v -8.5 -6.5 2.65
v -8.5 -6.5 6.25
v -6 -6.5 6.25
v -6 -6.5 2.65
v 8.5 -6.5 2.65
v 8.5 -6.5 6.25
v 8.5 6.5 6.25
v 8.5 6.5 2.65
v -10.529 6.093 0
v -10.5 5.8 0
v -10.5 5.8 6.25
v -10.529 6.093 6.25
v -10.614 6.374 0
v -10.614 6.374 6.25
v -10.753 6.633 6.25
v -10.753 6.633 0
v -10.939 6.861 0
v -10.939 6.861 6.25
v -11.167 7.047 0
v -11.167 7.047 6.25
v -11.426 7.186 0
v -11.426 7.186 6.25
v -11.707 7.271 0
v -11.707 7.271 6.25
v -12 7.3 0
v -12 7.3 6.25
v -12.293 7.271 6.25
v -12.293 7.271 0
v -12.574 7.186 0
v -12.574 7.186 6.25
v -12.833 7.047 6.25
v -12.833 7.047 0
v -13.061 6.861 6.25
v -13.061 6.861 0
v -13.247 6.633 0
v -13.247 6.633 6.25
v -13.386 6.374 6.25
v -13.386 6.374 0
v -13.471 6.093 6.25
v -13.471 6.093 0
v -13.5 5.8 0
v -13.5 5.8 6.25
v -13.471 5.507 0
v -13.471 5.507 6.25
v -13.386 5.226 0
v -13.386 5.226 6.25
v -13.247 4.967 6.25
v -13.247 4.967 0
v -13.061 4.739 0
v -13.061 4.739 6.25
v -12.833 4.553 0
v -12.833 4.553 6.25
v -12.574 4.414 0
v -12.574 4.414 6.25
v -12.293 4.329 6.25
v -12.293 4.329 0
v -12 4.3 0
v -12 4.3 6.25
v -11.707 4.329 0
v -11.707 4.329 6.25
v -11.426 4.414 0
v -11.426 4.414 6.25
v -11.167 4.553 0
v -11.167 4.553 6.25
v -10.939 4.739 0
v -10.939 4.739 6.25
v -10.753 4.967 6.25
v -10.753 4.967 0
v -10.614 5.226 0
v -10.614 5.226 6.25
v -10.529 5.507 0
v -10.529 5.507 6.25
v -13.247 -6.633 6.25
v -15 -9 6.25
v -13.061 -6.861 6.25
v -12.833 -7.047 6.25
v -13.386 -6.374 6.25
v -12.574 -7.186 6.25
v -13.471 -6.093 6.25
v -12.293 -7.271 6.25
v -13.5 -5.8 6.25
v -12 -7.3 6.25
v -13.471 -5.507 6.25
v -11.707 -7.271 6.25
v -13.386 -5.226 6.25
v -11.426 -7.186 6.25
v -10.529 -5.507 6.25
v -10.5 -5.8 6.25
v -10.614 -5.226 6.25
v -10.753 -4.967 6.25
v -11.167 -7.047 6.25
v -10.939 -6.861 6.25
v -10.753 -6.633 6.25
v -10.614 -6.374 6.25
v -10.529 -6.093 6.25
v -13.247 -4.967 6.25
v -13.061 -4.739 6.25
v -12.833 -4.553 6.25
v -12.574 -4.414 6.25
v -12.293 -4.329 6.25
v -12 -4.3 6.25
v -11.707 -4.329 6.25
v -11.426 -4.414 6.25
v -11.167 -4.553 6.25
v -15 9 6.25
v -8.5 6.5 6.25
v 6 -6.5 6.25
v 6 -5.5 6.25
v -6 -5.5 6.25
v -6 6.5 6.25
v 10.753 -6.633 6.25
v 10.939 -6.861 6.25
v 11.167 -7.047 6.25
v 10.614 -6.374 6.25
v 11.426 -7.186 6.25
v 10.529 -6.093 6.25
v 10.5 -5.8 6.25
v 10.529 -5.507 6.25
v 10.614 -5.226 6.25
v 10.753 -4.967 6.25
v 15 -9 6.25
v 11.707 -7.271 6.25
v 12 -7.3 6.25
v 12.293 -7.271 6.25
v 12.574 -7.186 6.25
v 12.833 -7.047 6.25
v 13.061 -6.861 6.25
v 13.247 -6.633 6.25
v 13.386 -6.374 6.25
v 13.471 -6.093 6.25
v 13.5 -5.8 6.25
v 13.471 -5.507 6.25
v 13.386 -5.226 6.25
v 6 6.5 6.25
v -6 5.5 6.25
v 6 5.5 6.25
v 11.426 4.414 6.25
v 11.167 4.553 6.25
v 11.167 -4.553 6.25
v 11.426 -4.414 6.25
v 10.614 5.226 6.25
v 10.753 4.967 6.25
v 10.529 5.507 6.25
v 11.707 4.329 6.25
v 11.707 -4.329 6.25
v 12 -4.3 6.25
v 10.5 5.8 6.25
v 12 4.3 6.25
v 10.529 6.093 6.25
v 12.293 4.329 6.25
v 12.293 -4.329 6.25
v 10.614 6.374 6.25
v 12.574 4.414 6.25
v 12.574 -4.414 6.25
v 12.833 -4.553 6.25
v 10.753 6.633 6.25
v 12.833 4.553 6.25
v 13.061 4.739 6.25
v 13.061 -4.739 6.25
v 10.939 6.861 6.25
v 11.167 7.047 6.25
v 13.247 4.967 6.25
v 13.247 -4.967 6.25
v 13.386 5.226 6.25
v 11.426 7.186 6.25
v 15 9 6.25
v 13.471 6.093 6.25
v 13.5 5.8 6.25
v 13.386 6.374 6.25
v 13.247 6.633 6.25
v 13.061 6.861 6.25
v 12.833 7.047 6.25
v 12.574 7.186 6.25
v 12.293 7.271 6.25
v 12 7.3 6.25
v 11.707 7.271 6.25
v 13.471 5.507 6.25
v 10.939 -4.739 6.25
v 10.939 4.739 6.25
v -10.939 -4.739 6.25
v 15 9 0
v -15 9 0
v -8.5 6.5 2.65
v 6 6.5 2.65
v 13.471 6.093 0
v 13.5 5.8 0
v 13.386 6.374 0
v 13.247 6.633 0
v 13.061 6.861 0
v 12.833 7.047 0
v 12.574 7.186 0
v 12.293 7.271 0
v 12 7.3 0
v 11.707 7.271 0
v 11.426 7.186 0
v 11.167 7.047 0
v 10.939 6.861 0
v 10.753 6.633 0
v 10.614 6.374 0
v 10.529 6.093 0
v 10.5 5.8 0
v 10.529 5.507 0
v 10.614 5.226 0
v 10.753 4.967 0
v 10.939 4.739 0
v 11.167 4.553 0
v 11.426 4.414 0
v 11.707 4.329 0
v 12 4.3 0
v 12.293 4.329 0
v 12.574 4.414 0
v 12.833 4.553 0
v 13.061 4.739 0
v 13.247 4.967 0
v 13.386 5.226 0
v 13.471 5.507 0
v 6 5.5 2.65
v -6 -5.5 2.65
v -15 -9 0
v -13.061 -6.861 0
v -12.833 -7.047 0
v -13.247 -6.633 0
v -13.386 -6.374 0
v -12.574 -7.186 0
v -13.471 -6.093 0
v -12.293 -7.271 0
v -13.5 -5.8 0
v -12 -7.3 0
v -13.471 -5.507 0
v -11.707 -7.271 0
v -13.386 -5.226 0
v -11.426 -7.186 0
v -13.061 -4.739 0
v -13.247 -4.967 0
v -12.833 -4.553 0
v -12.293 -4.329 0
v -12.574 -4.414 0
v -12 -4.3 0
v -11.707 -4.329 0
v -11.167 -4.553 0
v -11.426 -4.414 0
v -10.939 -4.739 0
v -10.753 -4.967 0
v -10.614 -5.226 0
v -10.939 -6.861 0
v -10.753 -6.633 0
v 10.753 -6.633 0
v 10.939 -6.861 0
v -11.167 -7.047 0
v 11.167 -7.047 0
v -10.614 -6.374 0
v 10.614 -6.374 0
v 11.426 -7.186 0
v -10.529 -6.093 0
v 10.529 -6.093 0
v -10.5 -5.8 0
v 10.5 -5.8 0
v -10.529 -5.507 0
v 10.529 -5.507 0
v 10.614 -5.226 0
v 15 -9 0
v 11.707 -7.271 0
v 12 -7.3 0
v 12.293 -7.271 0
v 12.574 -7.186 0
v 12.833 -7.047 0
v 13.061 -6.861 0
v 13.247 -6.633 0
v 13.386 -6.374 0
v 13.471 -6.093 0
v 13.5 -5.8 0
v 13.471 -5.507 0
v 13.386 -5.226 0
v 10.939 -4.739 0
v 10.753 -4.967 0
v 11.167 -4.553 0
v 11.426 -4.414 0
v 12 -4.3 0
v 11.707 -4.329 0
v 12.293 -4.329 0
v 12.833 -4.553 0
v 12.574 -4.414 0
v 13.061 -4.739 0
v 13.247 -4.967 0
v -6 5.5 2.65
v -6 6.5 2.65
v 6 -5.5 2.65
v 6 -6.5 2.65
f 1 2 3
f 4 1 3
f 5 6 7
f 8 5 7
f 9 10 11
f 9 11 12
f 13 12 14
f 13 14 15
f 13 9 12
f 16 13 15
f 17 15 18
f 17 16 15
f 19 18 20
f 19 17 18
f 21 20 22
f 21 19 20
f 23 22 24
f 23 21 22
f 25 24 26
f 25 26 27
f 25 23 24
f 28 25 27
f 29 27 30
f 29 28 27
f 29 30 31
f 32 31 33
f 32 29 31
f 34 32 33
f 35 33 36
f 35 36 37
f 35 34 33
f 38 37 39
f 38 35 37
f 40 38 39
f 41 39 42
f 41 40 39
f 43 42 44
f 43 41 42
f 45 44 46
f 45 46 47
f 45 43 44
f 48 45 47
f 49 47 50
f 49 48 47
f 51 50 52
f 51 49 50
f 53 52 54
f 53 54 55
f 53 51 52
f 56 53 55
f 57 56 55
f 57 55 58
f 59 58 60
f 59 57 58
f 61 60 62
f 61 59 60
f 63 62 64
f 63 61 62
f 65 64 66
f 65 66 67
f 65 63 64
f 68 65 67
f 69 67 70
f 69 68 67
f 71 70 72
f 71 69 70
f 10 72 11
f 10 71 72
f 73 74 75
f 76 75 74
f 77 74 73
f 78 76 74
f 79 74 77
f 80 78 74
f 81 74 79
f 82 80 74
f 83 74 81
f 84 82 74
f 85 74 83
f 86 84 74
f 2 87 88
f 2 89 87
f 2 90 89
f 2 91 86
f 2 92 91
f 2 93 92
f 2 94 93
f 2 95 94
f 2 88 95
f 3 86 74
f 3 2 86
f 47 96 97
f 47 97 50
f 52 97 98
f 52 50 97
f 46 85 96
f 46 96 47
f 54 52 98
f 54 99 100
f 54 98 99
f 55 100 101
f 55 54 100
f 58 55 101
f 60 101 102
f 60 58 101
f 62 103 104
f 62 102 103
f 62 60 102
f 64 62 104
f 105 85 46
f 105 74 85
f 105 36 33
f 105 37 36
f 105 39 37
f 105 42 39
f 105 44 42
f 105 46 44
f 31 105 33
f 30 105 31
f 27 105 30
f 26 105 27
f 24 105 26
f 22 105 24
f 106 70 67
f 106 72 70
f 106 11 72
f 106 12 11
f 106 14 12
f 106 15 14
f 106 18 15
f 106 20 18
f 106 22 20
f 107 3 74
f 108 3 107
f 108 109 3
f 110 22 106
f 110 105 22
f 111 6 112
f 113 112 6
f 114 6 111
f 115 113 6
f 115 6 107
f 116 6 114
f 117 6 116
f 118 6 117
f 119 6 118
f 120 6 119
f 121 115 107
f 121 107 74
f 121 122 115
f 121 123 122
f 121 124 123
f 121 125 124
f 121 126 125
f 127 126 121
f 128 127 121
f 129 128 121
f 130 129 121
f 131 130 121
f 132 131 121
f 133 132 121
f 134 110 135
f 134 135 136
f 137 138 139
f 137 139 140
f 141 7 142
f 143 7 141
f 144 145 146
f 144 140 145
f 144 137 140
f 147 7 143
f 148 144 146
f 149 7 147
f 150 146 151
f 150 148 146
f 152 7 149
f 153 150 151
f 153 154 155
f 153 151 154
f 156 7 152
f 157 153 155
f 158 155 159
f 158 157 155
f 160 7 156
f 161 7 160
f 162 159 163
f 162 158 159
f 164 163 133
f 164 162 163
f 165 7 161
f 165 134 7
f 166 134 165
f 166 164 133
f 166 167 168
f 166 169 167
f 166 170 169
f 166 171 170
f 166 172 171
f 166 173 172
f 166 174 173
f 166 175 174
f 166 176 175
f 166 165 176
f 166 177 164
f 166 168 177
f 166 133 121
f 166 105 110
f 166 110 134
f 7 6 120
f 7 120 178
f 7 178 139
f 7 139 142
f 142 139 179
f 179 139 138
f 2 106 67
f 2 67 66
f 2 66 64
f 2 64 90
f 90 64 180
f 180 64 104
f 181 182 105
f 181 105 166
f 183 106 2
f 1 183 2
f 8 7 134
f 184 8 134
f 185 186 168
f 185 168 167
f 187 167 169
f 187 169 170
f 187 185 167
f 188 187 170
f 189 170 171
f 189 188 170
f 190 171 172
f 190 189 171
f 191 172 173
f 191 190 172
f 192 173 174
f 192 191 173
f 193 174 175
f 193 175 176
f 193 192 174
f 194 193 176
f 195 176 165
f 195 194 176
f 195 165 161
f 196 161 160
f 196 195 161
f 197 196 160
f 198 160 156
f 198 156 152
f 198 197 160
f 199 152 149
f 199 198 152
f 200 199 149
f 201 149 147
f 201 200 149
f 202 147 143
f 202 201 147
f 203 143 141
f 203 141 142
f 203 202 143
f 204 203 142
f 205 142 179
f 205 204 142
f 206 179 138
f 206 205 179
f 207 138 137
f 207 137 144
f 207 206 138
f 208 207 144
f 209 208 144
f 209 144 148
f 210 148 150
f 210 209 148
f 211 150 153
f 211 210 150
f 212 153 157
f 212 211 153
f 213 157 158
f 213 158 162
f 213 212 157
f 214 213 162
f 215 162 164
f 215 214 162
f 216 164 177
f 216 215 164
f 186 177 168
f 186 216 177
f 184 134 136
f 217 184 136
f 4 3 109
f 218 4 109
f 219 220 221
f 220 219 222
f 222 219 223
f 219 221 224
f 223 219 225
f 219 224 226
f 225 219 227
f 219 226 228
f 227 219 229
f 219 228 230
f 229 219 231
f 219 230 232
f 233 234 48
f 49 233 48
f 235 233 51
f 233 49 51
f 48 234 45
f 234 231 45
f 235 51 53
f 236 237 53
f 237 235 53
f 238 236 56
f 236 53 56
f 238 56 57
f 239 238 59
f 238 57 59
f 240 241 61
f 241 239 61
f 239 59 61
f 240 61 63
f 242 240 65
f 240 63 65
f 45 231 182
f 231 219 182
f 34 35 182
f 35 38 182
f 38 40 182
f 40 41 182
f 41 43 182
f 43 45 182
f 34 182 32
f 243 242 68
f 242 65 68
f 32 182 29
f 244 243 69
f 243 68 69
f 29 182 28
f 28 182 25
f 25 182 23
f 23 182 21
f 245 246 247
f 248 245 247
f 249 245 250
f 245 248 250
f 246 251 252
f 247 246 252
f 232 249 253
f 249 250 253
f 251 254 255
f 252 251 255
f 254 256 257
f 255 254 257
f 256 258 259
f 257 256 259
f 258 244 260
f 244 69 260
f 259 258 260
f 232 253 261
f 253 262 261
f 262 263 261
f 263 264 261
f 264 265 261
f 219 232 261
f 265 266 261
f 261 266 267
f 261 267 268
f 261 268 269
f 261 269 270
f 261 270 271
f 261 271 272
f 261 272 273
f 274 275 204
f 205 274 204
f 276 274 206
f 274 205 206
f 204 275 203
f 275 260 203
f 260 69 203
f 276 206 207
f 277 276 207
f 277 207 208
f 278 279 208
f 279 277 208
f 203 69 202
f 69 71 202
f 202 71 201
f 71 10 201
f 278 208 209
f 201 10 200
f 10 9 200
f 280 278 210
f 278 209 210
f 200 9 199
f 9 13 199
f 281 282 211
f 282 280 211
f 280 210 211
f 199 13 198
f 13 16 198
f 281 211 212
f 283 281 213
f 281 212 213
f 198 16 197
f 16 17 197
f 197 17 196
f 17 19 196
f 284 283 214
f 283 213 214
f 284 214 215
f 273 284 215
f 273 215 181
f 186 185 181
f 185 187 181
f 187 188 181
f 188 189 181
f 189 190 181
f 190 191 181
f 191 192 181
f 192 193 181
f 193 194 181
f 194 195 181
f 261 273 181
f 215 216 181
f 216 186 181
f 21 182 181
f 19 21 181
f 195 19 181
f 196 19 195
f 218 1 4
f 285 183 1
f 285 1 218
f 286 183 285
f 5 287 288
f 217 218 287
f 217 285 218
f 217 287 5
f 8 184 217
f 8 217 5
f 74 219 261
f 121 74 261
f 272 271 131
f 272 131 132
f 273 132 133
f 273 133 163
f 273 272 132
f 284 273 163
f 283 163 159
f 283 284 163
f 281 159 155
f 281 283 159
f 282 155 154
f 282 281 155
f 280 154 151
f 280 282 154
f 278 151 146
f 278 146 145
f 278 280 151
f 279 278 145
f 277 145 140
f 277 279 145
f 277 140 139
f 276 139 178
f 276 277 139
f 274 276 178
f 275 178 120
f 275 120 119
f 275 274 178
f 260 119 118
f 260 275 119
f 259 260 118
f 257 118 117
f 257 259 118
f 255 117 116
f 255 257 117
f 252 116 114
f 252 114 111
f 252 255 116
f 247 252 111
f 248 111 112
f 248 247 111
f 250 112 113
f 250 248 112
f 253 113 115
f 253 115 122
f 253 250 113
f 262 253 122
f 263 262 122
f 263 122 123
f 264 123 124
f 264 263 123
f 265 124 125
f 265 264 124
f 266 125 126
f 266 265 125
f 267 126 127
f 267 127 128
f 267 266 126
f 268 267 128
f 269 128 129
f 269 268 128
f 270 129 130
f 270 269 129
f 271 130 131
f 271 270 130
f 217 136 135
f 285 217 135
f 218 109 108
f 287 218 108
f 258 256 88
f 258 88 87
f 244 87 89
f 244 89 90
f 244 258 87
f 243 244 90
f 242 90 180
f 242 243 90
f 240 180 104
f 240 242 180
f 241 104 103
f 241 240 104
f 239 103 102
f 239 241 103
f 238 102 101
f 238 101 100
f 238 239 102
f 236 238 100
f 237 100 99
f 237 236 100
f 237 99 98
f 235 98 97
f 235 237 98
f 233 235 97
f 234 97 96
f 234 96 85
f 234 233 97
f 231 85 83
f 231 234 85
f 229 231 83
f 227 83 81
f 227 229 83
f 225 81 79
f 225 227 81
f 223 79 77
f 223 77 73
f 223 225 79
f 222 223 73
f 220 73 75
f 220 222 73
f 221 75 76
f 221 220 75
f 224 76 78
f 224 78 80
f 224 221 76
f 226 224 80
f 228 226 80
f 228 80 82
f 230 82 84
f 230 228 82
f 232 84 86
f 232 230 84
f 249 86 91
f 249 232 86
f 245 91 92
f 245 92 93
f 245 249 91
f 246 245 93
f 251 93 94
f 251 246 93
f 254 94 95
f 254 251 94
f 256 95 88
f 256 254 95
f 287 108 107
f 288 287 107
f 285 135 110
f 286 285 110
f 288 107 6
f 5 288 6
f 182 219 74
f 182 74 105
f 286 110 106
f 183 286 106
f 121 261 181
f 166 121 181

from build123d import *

# Parameters (mm, degrees)
F0_W     = 30
F0_H     = 18
F0_R     = 1.5
F1_DEPTH = 6.25
F3_DEPTH = 3.6


with BuildPart() as f1:
    # F0 (on Top) → F1 (new body)
    with BuildSketch(Plane.XY):
        Rectangle(F0_W, F0_H)
        with Locations((-12, -5.8)):
            Circle(F0_R, mode=Mode.SUBTRACT)
        with Locations((12, -5.8)):
            Circle(F0_R, mode=Mode.SUBTRACT)
        with Locations((-12, 5.8)):
            Circle(F0_R, mode=Mode.SUBTRACT)
        with Locations((12, 5.8)):
            Circle(F0_R, mode=Mode.SUBTRACT)
    extrude(amount=F1_DEPTH)

    # F2 (on face) → F3 (cut)
    with BuildSketch(Plane.XY.offset(6.25)):
        Polygon((8.5, -6.5), (8.5, 6.5), (6, 6.5), (6, 5.5), (-6, 5.5), (-6, 6.5), (-8.5, 6.5), (-8.5, -6.5), (-6, -6.5), (-6, -5.5), (6, -5.5), (6, -6.5), align=None)
    extrude(amount=-F3_DEPTH, mode=Mode.SUBTRACT)


solid = f1.part
